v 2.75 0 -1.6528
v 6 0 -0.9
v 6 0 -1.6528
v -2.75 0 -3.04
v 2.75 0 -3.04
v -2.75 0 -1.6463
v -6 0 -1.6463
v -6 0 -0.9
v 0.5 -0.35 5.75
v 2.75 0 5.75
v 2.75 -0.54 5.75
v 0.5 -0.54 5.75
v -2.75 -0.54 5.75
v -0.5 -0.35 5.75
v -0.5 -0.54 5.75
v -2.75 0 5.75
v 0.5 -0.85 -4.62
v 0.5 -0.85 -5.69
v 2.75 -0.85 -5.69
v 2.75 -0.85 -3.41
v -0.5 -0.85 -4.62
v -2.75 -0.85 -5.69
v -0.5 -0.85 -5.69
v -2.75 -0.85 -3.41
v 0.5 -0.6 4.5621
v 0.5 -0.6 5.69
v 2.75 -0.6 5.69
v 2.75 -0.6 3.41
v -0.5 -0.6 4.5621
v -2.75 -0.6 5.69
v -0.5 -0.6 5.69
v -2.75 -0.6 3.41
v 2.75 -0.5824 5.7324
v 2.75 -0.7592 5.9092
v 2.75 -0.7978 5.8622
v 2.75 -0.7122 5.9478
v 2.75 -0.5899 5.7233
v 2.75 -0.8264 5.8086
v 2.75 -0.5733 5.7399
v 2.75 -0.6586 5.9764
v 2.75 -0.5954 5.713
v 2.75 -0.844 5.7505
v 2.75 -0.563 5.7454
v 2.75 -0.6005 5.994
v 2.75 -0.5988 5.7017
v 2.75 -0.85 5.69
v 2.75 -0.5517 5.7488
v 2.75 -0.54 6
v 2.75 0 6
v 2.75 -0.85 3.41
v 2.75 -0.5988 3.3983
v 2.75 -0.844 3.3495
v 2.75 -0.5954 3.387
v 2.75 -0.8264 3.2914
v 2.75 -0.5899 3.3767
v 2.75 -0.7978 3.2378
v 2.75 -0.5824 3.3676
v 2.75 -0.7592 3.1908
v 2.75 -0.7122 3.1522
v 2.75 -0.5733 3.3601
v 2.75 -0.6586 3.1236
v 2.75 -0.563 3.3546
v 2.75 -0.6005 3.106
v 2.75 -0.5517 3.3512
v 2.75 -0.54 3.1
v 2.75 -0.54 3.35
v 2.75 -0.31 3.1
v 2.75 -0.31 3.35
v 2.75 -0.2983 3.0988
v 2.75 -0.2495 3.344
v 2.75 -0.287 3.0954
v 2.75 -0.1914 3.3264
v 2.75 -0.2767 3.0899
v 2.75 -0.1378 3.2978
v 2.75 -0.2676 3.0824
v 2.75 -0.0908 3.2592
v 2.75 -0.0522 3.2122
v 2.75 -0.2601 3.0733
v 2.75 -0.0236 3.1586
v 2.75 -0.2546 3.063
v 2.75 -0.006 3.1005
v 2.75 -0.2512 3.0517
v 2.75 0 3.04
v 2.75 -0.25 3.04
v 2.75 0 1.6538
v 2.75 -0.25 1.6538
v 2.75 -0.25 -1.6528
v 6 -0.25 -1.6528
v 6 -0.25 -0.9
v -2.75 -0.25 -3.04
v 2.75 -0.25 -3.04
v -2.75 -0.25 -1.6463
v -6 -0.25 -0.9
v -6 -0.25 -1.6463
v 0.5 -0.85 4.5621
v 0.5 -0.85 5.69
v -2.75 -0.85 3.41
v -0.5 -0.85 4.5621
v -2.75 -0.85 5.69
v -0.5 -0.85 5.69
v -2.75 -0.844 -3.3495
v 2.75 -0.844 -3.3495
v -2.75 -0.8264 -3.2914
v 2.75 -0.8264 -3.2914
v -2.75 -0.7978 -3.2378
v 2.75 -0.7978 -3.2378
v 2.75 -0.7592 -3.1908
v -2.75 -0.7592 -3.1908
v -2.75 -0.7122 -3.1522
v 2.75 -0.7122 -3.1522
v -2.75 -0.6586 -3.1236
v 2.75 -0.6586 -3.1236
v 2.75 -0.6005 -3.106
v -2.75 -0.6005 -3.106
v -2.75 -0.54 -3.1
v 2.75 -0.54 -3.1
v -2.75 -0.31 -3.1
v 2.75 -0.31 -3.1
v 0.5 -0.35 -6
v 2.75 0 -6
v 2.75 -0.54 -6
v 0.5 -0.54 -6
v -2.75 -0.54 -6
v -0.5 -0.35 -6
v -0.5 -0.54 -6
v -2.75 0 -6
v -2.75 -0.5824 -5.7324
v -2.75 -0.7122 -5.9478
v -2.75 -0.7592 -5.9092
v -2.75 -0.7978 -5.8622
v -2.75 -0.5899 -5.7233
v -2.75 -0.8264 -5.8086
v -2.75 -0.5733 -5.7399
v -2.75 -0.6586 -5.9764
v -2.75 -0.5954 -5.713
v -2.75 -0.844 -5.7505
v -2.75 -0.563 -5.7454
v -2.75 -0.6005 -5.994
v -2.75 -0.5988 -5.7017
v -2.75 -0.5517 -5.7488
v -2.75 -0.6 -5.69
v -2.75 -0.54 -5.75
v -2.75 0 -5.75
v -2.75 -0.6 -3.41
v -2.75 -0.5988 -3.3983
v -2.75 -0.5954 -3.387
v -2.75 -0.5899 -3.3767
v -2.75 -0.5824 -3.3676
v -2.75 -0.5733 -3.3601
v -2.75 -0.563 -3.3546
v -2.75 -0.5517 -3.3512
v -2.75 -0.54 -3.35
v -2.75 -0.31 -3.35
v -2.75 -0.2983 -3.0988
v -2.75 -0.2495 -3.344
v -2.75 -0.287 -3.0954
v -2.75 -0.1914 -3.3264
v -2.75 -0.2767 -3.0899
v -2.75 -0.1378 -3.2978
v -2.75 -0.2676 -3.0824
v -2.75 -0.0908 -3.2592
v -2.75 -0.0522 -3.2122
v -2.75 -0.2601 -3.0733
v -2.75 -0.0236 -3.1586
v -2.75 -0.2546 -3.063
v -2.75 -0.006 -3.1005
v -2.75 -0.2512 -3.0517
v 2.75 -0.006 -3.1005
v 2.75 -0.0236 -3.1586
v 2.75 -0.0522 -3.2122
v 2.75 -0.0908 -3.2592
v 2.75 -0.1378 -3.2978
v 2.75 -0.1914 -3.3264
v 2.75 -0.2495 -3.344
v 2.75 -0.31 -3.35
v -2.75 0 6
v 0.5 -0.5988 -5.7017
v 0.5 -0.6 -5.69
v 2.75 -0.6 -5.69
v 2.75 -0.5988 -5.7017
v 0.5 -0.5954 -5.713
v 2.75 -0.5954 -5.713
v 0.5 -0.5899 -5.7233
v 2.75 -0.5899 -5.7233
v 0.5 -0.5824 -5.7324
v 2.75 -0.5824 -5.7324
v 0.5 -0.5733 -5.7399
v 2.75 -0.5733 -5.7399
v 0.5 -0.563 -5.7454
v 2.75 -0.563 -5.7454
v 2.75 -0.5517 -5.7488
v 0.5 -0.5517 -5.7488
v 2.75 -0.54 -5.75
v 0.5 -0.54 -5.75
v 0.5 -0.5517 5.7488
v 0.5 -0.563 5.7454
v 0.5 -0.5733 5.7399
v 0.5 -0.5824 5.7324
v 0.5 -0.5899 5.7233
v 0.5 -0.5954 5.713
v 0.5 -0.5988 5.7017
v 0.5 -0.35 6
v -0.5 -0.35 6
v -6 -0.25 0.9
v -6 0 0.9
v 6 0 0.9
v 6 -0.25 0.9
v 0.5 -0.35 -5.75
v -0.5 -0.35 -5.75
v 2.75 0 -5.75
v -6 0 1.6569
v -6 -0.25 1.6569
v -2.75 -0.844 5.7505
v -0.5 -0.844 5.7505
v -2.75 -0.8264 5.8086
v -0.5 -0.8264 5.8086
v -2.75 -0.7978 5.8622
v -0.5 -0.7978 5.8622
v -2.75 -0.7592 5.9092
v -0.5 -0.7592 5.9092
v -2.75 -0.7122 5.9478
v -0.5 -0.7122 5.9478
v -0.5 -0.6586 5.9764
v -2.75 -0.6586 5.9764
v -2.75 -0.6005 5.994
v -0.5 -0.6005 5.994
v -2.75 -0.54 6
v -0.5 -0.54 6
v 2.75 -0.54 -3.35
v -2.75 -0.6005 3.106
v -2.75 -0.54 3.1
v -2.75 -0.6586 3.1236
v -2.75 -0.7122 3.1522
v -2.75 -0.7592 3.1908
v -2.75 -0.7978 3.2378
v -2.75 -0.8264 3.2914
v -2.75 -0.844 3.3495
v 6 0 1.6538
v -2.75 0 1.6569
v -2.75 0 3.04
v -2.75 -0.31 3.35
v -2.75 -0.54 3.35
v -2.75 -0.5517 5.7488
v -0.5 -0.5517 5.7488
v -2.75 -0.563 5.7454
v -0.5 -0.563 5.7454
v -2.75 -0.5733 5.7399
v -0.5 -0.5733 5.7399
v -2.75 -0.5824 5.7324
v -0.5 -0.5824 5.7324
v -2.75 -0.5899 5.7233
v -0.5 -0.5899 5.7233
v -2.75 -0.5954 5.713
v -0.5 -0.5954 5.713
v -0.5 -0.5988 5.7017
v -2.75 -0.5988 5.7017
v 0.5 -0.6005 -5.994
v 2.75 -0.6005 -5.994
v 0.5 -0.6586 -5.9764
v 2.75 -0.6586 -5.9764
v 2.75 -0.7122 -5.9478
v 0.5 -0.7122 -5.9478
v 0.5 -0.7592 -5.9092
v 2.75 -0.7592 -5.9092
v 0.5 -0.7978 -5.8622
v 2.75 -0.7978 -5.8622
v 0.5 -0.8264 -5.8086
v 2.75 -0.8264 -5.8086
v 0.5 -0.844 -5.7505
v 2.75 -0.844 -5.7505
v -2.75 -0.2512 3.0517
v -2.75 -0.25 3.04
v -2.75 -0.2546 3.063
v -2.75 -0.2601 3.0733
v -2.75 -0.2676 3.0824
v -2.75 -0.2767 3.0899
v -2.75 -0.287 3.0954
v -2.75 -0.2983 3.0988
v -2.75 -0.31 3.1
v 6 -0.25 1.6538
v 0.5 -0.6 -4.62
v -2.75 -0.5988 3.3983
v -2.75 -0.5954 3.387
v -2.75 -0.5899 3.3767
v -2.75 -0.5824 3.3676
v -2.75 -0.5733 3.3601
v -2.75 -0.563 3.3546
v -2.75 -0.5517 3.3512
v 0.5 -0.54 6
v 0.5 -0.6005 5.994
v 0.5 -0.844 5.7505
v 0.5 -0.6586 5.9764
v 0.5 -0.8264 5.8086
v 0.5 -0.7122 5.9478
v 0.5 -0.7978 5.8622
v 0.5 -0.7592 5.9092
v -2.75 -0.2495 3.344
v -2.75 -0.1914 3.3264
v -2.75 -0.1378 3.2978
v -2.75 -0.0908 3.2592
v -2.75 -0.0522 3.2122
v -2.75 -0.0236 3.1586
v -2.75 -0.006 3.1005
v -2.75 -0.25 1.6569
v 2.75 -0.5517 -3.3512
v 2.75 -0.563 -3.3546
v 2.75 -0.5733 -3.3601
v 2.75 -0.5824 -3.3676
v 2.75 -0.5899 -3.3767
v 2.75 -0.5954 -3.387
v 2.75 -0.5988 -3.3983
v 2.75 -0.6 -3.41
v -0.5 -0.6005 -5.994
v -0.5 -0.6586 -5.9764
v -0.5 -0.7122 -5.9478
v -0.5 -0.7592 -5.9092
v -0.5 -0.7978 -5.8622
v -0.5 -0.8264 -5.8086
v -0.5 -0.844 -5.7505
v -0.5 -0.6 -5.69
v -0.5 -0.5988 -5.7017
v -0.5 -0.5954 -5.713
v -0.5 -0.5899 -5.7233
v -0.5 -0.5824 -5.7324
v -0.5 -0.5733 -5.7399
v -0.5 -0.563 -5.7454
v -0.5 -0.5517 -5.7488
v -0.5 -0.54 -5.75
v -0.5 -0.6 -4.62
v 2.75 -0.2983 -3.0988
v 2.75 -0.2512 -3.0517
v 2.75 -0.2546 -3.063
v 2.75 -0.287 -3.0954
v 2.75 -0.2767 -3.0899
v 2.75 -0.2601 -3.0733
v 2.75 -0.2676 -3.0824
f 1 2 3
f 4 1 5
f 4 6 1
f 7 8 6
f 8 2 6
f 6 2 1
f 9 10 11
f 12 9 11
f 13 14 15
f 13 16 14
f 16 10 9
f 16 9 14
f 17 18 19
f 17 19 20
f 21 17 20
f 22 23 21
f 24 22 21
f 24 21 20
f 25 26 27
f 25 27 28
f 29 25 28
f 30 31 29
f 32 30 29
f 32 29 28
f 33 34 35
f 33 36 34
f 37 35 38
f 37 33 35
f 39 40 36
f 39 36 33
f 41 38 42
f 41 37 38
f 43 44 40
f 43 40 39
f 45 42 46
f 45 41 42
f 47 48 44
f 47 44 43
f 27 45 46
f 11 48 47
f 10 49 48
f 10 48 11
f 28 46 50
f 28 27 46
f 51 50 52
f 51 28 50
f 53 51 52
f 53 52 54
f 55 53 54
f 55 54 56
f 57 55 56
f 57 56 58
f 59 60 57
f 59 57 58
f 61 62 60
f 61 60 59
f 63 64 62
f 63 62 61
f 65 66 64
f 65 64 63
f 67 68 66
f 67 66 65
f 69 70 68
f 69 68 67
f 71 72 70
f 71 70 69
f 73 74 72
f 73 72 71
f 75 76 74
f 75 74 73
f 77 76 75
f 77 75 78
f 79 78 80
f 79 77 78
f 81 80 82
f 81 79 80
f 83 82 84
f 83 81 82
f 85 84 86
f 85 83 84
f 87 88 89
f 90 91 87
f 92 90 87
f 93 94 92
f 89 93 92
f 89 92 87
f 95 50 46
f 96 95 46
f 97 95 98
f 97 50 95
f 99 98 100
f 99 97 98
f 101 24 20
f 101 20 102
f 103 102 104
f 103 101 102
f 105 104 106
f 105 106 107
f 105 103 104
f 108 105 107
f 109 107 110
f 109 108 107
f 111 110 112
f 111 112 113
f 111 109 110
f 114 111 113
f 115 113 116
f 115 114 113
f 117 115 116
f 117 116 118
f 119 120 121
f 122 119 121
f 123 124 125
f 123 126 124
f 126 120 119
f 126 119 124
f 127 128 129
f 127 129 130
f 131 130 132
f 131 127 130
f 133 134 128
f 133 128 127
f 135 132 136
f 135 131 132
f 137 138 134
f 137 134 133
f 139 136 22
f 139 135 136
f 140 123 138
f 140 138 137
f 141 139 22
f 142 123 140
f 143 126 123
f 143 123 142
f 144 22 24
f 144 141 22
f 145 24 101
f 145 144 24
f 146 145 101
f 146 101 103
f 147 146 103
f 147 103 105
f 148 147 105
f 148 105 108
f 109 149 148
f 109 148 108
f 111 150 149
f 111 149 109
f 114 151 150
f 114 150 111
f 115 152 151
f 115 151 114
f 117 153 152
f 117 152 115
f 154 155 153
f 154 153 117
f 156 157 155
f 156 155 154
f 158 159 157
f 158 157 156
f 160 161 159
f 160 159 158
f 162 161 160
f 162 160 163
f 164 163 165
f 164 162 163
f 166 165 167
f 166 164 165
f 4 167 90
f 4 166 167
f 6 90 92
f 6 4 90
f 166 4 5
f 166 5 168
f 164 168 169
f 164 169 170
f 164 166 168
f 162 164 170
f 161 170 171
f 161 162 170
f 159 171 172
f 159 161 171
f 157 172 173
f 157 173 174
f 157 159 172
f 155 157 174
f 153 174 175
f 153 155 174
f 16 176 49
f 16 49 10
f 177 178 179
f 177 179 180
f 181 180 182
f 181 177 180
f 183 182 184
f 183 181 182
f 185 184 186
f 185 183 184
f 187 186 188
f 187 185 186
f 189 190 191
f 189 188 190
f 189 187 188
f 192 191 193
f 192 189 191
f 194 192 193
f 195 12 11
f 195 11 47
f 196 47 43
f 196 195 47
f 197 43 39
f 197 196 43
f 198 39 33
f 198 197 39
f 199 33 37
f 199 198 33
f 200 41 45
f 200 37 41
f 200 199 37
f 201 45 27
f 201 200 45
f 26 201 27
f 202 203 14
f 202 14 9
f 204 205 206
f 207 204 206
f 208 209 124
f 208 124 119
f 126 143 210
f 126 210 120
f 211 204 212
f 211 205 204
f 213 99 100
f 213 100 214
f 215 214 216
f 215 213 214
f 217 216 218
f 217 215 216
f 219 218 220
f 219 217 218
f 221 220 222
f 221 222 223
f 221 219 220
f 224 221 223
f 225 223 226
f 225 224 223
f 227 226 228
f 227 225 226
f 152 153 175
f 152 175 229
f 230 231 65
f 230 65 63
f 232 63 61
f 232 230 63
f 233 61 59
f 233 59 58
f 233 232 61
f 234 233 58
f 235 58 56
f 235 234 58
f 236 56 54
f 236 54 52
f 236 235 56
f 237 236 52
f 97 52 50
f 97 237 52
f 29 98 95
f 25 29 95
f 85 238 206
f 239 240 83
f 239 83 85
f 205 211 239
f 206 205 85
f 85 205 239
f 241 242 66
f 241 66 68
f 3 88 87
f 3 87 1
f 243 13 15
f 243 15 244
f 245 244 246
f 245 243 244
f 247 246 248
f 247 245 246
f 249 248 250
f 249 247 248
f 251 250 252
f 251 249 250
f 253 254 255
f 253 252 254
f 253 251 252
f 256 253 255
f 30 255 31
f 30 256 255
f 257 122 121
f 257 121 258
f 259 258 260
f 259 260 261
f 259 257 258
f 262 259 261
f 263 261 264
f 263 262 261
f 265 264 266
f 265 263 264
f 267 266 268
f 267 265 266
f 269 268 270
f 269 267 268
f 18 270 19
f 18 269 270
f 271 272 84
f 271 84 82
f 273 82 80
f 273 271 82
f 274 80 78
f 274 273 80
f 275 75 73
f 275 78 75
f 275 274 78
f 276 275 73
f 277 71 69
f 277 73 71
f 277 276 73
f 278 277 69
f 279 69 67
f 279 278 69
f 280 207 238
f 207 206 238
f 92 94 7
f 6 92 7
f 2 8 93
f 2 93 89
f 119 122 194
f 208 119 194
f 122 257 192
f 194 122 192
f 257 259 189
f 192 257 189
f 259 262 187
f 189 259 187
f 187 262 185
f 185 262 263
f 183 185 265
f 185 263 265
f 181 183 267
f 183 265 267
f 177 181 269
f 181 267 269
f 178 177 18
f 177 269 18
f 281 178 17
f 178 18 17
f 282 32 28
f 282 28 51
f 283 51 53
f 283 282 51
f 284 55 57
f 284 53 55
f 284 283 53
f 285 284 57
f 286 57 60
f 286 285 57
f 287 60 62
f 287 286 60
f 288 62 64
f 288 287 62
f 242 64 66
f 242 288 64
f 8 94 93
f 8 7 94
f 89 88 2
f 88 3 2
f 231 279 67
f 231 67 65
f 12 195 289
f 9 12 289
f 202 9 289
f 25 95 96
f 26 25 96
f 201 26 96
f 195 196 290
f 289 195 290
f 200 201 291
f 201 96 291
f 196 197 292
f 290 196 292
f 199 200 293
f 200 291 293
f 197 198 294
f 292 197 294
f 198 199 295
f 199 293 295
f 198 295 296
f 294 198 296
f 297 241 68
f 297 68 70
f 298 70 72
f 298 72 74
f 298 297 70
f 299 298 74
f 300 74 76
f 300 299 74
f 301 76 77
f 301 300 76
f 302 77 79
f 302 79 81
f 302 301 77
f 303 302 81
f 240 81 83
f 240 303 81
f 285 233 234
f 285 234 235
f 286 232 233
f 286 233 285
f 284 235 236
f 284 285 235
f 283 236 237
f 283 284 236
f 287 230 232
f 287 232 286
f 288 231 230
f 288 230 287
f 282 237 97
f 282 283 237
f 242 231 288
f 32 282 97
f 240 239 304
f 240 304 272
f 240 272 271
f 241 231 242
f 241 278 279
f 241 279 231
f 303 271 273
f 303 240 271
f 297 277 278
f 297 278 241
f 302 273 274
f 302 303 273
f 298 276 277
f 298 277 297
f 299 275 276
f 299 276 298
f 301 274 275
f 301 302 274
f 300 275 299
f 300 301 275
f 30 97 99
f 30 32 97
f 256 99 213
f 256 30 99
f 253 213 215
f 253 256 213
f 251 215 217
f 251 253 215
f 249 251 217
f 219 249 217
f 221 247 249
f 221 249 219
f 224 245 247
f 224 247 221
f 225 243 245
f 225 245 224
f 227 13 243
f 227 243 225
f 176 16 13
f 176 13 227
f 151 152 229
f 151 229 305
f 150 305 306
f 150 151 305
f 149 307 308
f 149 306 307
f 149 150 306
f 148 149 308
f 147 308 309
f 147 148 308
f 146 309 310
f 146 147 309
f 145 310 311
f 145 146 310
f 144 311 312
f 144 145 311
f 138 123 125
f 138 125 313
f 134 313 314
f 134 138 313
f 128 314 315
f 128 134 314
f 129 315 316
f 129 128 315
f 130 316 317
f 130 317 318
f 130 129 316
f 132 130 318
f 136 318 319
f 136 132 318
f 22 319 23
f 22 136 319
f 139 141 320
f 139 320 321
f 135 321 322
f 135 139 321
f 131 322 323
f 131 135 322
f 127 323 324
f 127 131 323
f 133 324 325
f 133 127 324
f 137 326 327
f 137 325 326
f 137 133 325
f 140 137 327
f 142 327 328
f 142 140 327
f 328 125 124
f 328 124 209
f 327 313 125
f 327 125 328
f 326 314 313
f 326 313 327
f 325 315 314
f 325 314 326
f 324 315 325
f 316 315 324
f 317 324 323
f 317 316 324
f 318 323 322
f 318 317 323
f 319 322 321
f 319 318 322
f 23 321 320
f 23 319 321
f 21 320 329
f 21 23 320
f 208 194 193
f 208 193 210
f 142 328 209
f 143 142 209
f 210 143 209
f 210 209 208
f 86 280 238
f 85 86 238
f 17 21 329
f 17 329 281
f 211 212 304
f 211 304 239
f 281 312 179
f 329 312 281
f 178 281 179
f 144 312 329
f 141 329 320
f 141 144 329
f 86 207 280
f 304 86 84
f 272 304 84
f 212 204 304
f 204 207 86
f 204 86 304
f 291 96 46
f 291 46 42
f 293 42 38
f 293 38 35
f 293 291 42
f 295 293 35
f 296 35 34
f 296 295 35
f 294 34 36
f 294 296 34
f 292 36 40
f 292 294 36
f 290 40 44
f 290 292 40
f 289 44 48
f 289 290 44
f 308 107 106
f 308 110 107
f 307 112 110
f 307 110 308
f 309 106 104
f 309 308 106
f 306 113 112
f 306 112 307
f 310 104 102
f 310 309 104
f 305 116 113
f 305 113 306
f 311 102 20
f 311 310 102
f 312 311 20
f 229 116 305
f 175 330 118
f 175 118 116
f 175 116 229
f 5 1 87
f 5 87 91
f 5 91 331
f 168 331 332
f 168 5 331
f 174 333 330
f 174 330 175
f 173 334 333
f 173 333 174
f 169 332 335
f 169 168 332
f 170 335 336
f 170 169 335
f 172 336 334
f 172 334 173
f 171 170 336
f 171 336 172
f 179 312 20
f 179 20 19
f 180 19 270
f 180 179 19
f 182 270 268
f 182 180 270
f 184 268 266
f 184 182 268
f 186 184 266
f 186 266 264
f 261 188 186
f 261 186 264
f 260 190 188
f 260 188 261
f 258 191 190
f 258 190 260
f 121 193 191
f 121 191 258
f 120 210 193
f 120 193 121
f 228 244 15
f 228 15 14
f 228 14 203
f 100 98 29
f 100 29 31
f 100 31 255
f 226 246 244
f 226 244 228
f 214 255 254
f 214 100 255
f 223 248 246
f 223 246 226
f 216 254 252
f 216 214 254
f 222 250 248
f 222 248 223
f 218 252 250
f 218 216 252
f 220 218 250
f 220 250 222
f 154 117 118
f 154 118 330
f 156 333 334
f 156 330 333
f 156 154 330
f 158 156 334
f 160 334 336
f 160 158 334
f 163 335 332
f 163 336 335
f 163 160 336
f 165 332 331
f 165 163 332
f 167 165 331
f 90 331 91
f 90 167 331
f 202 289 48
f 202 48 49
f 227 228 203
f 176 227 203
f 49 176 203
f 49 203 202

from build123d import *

# Parameters (mm, degrees)
BASE_FLANGE1_DEPTH      = 6
BASE_FLANGE1_DEPTH_BACK = 6
SKETCH6_W               = 13.296859842
SKETCH6_H               = 1.8
CUT_EXTRUDE1_DEPTH      = 9.527748824
SKETCH13_W              = 4.845267679
SKETCH13_H              = 2.171613948
CUT_EXTRUDE2_DEPTH      = 3.25
SKETCH14_W              = 4.988611219
SKETCH14_H              = 2.401394512
CUT_EXTRUDE3_DEPTH      = 3.25
SKETCH15_W              = 4.899845387
SKETCH15_H              = 2.254166158
CUT_EXTRUDE4_DEPTH      = 3.25
SKETCH16_W              = 4.867112092
SKETCH16_H              = 2.480011595
CUT_EXTRUDE5_DEPTH      = 3.25
SKETCH20_W              = 1
SKETCH20_H              = 1.552815678
CUT_EXTRUDE8_DEPTH      = 0.5
SKETCH21_W              = 1
SKETCH21_H              = 1.847683093
CUT_EXTRUDE9_DEPTH      = 0.5


# Sheet-metal steps are written as plain solids
with BuildPart() as part:
    # Sketch1 → Base-Flange1 (new, two sides: drawn at the far end of the back side and taken through both)
    with BuildSketch(Plane(origin=(0, 0, 0), x_dir=(0, 0, -1), z_dir=(1, 0, 0)).offset(-BASE_FLANGE1_DEPTH_BACK)):
        with BuildLine():
            Line((-5.75, 0), (-5.75, -0.54))
            ThreePointArc((-5.75, -0.54), (-5.732426407, -0.582426407), (-5.69, -0.6))
            Line((-5.69, -0.6), (-3.41, -0.6))
            ThreePointArc((-3.41, -0.6), (-3.367573593, -0.582426407), (-3.35, -0.54))
            Line((-3.35, -0.54), (-3.35, -0.31))
            ThreePointArc((-3.35, -0.31), (-3.259203102, -0.090796898), (-3.04, 0))
            Line((-3.04, 0), (3.04, 0))
            ThreePointArc((3.04, 0), (3.259203102, -0.090796898), (3.35, -0.31))
            Line((3.35, -0.31), (3.35, -0.54))
            ThreePointArc((3.35, -0.54), (3.367573593, -0.582426407), (3.41, -0.6))
            Line((3.41, -0.6), (5.69, -0.6))
            ThreePointArc((5.69, -0.6), (5.732426407, -0.582426407), (5.75, -0.54))
            Line((5.75, -0.54), (5.75, 0))
            Line((5.75, 0), (6, 0))
            Line((6, 0), (6, -0.54))
            ThreePointArc((6, -0.54), (5.909203102, -0.759203102), (5.69, -0.85))
            Line((5.69, -0.85), (3.41, -0.85))
            ThreePointArc((3.41, -0.85), (3.190796898, -0.759203102), (3.1, -0.54))
            Line((3.1, -0.54), (3.1, -0.31))
            ThreePointArc((3.1, -0.31), (3.082426407, -0.267573593), (3.04, -0.25))
            Line((3.04, -0.25), (-3.04, -0.25))
            ThreePointArc((-3.04, -0.25), (-3.082426407, -0.267573593), (-3.1, -0.31))
            Line((-3.1, -0.31), (-3.1, -0.54))
            ThreePointArc((-3.1, -0.54), (-3.190796898, -0.759203102), (-3.41, -0.85))
            Line((-3.41, -0.85), (-5.69, -0.85))
            ThreePointArc((-5.69, -0.85), (-5.909203102, -0.759203102), (-6, -0.54))
            Line((-6, -0.54), (-6, 0))
            Line((-6, 0), (-5.75, 0))
        make_face()
    extrude(amount=BASE_FLANGE1_DEPTH + BASE_FLANGE1_DEPTH_BACK)

    # Sketch6 → Cut-Extrude1 (cut, through all)
    with BuildSketch(Plane(origin=(0, 0, 0), x_dir=(1, 0, 0), z_dir=(0, 1, 0))):
        Rectangle(SKETCH6_W, SKETCH6_H)
    extrude(amount=-CUT_EXTRUDE1_DEPTH, mode=Mode.SUBTRACT)


with BuildPart() as cut_extrude1_piece_1:
    # of the separate pieces the step leaves, piece 1, a body of its own (cut_extrude1_pieces)
    add(part.part.solids().sort_by_distance((6, -0.85, 5.69))[0])

    # Sketch14 → Cut-Extrude3 (cut)
    with BuildSketch(Plane.ZY.offset(6)):
        with Locations((4.151248365, -0.072869224)):
            Rectangle(SKETCH14_W, SKETCH14_H)
    extrude(amount=-CUT_EXTRUDE3_DEPTH, mode=Mode.SUBTRACT)

    # Sketch15 → Cut-Extrude4 (cut)
    with BuildSketch(Plane(origin=(6, 0, 0), x_dir=(0, 0, -1), z_dir=(1, 0, 0))):
        with Locations((-4.103738605, -0.027890916)):
            Rectangle(SKETCH15_W, SKETCH15_H)
    extrude(amount=-CUT_EXTRUDE4_DEPTH, mode=Mode.SUBTRACT)

    # Sketch21 → Cut-Extrude9 (cut)
    with BuildSketch(Plane.XZ.offset(0.85)):
        with Locations((0, 5.485895168)):
            Rectangle(SKETCH21_W, SKETCH21_H)
    extrude(amount=-CUT_EXTRUDE9_DEPTH, mode=Mode.SUBTRACT)


with BuildPart() as cut_extrude1_piece_2:
    # of the separate pieces the step leaves, piece 2, a body of its own (cut_extrude1_pieces)
    add(part.part.solids().sort_by_distance((6, -0.25, -3.04))[0])

    # Sketch13 → Cut-Extrude2 (cut)
    with BuildSketch(Plane.ZY.offset(6)):
        with Locations((-4.068980064, -0.124769523)):
            Rectangle(SKETCH13_W, SKETCH13_H)
    extrude(amount=-CUT_EXTRUDE2_DEPTH, mode=Mode.SUBTRACT)

    # Sketch16 → Cut-Extrude5 (cut)
    with BuildSketch(Plane(origin=(6, 0, 0), x_dir=(0, 0, -1), z_dir=(1, 0, 0))):
        with Locations((4.086402332, -0.000253921)):
            Rectangle(SKETCH16_W, SKETCH16_H)
    extrude(amount=-CUT_EXTRUDE5_DEPTH, mode=Mode.SUBTRACT)

    # Sketch20 → Cut-Extrude8 (cut)
    with BuildSketch(Plane.XZ.offset(0.85)):
        with Locations((0, -5.396434848)):
            Rectangle(SKETCH20_W, SKETCH20_H)
    extrude(amount=-CUT_EXTRUDE8_DEPTH, mode=Mode.SUBTRACT)


solid = Compound([cut_extrude1_piece_1.part, cut_extrude1_piece_2.part])
